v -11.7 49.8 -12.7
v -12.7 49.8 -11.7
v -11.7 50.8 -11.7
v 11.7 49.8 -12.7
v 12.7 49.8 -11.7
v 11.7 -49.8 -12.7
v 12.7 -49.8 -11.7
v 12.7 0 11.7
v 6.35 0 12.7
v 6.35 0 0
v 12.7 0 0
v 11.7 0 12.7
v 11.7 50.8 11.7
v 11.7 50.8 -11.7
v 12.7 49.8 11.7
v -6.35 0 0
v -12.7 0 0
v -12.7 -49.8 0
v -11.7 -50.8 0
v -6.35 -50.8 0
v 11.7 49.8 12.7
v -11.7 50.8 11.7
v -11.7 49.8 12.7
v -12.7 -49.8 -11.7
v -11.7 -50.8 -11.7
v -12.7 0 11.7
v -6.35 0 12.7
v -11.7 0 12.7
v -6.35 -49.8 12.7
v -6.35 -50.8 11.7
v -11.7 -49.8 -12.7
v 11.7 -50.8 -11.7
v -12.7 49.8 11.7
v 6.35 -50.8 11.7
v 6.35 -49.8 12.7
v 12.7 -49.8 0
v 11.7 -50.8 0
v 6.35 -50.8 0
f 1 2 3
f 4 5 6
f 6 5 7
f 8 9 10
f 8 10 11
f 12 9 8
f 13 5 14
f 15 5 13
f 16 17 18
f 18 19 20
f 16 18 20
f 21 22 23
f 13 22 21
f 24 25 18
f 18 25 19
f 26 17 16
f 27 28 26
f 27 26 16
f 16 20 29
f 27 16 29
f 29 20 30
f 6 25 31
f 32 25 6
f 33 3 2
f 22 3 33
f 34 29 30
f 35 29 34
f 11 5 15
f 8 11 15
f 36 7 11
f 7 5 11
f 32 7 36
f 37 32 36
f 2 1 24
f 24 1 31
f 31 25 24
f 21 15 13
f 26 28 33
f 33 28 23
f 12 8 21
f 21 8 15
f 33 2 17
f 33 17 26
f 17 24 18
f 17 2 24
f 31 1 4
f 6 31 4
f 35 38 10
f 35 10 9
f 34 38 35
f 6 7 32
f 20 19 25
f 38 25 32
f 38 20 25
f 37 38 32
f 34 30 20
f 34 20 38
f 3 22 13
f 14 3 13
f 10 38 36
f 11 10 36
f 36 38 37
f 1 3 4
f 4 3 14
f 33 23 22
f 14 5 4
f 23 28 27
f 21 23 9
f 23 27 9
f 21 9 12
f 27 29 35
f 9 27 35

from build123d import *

# Parameters (mm, degrees)
F0_W     = 25.4
F0_H     = 25.4
F1_DEPTH = 50.8
F2_W     = 6.35
F2_H     = 12.7
F3_DEPTH = 50.8
F4_SIZE  = 1


with BuildPart() as f1:
    # F0 (on Front) → F1 (new body, symmetric)
    with BuildSketch(Plane.XZ):
        Rectangle(F0_W, F0_H)
    extrude(amount=F1_DEPTH, both=True)

    # F2 (on face) → F3 (cut)
    with BuildSketch(Plane.XZ.offset(50.8)):
        with Locations((-9.525, 6.35)):
            Rectangle(F2_W, F2_H)
        with Locations((9.525, 6.35)):
            Rectangle(F2_W, F2_H)
    extrude(amount=-F3_DEPTH, mode=Mode.SUBTRACT)

    # F4
    f4_edges = [f1.edges().sort_by_distance(p)[0] for p in [
        (12.7, 25.4, 12.7),
        (12.7, 0, -12.7),
        (12.7, 50.8, 0),
        (12.7, -50.8, -6.35),
        (0, -50.8, 12.7),
        (-12.7, -50.8, -6.35),
        (-12.7, 25.4, 12.7),
        (0, 50.8, 12.7),
        (0, -50.8, -12.7),
        (-12.7, 0, -12.7),
        (-12.7, 50.8, 0),
        (0, 50.8, -12.7),
    ]]
    chamfer(f4_edges, length=F4_SIZE)


solid = f1.part
